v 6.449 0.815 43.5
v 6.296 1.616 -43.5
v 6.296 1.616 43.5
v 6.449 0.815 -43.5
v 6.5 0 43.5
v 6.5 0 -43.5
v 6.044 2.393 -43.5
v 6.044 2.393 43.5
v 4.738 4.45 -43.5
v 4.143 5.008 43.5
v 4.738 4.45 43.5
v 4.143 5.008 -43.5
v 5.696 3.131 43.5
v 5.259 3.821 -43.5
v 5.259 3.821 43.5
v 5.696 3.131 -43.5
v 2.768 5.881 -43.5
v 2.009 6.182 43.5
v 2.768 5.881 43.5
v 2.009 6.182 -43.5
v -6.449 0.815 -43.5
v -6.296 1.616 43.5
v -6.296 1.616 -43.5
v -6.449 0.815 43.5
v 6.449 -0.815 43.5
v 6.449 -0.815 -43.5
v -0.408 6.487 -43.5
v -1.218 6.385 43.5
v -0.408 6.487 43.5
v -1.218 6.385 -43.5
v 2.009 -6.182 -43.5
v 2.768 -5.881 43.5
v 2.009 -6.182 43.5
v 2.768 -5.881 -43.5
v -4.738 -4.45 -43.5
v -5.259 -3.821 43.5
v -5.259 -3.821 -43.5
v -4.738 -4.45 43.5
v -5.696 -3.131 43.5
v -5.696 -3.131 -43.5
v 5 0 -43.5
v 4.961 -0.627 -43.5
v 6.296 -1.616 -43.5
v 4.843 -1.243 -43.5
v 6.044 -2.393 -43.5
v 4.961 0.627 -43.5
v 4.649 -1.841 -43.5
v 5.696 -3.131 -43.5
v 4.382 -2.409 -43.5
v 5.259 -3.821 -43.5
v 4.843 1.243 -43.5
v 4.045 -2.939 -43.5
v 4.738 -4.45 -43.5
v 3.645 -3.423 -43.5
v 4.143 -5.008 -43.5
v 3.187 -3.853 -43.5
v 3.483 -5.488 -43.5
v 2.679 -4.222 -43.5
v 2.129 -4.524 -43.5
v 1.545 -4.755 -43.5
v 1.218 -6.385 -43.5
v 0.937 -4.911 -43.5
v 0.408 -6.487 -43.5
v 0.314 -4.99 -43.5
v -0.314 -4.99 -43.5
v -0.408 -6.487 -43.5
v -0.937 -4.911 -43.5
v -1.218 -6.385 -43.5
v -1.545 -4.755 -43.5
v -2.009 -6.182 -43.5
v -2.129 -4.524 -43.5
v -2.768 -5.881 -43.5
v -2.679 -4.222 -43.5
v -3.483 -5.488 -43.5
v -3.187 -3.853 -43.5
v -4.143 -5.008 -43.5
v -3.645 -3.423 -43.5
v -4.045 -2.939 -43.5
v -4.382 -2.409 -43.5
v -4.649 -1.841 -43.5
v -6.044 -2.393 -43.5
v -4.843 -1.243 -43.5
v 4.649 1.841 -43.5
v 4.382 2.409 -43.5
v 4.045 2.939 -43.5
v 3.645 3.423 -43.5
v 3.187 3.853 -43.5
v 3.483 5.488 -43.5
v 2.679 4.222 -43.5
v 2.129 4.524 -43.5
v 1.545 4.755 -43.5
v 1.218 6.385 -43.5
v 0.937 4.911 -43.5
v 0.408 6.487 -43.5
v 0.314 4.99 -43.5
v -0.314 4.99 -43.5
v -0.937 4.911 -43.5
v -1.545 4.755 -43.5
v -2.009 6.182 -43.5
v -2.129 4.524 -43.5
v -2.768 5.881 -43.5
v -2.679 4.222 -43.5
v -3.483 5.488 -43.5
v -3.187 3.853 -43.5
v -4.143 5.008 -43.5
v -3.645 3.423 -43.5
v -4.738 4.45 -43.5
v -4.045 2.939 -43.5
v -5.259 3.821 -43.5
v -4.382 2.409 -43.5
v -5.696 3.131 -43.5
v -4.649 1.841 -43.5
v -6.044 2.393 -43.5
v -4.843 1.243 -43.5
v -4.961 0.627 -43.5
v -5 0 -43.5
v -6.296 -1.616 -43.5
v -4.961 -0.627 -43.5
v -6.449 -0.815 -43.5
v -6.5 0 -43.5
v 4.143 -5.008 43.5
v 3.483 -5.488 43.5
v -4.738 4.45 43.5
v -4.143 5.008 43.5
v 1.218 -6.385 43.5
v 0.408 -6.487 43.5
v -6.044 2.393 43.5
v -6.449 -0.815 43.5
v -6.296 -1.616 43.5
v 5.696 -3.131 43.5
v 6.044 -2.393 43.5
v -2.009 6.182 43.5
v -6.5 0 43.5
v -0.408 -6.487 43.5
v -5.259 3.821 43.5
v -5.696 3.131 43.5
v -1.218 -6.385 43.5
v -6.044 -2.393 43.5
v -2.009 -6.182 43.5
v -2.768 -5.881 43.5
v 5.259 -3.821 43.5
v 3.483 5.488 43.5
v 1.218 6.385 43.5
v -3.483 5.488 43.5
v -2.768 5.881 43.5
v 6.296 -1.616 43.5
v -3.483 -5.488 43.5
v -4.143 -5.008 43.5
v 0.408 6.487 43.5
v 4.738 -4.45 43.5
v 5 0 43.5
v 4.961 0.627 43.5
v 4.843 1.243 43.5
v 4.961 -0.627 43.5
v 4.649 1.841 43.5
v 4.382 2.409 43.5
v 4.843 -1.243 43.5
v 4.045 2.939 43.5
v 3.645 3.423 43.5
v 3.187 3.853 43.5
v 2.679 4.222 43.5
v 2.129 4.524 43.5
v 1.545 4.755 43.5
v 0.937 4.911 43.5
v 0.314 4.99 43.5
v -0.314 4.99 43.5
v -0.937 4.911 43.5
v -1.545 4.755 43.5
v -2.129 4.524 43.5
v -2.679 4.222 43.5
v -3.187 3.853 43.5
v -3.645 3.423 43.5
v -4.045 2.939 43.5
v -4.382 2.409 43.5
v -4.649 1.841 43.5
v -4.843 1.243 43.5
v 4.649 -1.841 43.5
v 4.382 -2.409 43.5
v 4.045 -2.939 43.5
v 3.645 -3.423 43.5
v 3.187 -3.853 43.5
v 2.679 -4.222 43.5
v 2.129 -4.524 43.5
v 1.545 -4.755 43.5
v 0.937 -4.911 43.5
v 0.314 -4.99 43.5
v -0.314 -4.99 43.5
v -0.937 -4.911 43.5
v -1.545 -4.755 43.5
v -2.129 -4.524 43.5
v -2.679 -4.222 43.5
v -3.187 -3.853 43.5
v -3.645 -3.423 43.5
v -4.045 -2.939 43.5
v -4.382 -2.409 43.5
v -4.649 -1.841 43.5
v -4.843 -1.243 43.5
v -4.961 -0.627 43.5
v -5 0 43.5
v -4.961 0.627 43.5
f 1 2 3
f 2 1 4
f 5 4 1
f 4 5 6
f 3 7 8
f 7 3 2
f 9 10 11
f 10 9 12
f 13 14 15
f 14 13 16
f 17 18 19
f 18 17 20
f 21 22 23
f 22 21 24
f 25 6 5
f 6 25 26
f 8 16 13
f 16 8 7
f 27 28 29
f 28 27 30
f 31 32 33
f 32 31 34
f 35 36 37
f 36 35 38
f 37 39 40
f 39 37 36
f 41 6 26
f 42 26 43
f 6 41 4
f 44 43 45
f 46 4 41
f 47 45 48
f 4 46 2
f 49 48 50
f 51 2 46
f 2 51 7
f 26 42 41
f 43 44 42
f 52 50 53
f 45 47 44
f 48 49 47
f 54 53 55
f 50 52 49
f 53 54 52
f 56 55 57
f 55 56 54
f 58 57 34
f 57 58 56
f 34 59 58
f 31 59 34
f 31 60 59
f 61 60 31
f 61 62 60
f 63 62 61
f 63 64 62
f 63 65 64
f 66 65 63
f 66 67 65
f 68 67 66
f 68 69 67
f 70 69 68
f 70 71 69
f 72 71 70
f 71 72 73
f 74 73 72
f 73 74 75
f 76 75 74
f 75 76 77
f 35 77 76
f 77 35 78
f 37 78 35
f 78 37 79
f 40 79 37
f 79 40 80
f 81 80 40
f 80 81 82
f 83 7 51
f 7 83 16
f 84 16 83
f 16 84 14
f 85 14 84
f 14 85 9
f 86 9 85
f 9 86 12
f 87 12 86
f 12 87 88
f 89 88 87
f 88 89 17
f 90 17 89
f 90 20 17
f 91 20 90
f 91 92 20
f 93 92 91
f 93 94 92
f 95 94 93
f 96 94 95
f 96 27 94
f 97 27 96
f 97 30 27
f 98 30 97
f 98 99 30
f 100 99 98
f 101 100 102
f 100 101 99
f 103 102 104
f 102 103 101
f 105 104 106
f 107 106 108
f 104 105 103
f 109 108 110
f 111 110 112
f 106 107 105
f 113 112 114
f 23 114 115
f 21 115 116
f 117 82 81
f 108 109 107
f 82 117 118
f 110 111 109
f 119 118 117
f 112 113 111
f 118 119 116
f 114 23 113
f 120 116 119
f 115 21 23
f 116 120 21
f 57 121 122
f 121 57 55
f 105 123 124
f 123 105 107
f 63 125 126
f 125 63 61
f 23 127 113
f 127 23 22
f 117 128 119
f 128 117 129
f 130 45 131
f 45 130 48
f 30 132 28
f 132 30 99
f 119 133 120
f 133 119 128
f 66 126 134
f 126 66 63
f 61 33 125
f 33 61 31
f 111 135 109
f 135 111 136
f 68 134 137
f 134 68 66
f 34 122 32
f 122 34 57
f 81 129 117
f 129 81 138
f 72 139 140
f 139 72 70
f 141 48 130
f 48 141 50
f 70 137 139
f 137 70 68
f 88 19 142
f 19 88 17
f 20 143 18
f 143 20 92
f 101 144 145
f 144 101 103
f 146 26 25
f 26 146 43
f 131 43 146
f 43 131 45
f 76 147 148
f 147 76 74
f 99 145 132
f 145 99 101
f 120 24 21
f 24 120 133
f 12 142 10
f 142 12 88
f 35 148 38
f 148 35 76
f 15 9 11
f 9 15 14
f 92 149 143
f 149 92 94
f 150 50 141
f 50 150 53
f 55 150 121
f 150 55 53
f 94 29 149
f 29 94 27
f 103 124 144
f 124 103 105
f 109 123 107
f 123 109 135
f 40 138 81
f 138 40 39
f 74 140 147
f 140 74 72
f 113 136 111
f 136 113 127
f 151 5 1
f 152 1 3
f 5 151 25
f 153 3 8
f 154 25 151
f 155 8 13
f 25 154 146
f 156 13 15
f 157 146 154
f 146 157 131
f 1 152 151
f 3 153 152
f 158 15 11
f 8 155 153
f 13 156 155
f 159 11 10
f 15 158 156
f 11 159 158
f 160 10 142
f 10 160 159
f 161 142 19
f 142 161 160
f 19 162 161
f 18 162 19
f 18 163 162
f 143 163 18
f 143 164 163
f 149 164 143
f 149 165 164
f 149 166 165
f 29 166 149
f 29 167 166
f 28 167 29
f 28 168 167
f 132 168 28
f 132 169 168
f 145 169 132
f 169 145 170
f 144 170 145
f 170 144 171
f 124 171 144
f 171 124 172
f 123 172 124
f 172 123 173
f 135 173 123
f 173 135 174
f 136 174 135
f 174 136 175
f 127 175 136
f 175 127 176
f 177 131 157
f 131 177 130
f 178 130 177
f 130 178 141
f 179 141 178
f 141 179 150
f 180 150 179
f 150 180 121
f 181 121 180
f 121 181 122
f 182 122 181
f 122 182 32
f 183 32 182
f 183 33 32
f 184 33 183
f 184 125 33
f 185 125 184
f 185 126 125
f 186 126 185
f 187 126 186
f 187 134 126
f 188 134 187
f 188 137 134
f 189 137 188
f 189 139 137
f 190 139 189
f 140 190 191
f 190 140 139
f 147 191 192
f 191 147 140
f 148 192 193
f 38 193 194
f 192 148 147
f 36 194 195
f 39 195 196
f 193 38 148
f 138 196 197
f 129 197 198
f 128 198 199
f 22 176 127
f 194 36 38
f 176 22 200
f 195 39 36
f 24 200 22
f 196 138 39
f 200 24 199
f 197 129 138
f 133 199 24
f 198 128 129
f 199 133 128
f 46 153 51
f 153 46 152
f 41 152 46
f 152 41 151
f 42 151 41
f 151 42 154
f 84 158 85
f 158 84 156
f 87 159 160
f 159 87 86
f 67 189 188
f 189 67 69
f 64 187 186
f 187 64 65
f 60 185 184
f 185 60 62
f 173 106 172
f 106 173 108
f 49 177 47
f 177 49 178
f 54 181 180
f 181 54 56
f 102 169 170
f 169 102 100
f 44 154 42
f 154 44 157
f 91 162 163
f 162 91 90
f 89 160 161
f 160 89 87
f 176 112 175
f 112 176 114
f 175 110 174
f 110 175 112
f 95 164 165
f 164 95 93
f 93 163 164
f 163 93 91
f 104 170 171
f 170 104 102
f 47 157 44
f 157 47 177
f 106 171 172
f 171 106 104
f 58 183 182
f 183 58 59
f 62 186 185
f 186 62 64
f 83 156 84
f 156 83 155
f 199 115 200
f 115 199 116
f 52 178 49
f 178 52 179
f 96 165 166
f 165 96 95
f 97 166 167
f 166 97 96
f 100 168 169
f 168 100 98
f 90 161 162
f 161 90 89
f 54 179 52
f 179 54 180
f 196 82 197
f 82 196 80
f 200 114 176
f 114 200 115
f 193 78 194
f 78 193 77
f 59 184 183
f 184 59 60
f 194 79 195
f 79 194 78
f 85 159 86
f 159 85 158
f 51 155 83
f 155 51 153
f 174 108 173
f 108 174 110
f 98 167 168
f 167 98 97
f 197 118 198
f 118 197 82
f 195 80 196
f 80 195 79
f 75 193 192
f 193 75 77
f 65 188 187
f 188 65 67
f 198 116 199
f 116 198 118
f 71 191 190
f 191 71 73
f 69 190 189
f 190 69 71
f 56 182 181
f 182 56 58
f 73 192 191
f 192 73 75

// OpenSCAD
$fn = 50;


difference() {
	union() {
		translate(v = [0, 0, -43.5000000000]) {
			cylinder(h = 87, r = 6.5000000000);
		}
	}
	union() {
		translate(v = [0, 0, -100.0000000000]) {
			cylinder(h = 200, r = 5.0000000000);
		}
	}
}
